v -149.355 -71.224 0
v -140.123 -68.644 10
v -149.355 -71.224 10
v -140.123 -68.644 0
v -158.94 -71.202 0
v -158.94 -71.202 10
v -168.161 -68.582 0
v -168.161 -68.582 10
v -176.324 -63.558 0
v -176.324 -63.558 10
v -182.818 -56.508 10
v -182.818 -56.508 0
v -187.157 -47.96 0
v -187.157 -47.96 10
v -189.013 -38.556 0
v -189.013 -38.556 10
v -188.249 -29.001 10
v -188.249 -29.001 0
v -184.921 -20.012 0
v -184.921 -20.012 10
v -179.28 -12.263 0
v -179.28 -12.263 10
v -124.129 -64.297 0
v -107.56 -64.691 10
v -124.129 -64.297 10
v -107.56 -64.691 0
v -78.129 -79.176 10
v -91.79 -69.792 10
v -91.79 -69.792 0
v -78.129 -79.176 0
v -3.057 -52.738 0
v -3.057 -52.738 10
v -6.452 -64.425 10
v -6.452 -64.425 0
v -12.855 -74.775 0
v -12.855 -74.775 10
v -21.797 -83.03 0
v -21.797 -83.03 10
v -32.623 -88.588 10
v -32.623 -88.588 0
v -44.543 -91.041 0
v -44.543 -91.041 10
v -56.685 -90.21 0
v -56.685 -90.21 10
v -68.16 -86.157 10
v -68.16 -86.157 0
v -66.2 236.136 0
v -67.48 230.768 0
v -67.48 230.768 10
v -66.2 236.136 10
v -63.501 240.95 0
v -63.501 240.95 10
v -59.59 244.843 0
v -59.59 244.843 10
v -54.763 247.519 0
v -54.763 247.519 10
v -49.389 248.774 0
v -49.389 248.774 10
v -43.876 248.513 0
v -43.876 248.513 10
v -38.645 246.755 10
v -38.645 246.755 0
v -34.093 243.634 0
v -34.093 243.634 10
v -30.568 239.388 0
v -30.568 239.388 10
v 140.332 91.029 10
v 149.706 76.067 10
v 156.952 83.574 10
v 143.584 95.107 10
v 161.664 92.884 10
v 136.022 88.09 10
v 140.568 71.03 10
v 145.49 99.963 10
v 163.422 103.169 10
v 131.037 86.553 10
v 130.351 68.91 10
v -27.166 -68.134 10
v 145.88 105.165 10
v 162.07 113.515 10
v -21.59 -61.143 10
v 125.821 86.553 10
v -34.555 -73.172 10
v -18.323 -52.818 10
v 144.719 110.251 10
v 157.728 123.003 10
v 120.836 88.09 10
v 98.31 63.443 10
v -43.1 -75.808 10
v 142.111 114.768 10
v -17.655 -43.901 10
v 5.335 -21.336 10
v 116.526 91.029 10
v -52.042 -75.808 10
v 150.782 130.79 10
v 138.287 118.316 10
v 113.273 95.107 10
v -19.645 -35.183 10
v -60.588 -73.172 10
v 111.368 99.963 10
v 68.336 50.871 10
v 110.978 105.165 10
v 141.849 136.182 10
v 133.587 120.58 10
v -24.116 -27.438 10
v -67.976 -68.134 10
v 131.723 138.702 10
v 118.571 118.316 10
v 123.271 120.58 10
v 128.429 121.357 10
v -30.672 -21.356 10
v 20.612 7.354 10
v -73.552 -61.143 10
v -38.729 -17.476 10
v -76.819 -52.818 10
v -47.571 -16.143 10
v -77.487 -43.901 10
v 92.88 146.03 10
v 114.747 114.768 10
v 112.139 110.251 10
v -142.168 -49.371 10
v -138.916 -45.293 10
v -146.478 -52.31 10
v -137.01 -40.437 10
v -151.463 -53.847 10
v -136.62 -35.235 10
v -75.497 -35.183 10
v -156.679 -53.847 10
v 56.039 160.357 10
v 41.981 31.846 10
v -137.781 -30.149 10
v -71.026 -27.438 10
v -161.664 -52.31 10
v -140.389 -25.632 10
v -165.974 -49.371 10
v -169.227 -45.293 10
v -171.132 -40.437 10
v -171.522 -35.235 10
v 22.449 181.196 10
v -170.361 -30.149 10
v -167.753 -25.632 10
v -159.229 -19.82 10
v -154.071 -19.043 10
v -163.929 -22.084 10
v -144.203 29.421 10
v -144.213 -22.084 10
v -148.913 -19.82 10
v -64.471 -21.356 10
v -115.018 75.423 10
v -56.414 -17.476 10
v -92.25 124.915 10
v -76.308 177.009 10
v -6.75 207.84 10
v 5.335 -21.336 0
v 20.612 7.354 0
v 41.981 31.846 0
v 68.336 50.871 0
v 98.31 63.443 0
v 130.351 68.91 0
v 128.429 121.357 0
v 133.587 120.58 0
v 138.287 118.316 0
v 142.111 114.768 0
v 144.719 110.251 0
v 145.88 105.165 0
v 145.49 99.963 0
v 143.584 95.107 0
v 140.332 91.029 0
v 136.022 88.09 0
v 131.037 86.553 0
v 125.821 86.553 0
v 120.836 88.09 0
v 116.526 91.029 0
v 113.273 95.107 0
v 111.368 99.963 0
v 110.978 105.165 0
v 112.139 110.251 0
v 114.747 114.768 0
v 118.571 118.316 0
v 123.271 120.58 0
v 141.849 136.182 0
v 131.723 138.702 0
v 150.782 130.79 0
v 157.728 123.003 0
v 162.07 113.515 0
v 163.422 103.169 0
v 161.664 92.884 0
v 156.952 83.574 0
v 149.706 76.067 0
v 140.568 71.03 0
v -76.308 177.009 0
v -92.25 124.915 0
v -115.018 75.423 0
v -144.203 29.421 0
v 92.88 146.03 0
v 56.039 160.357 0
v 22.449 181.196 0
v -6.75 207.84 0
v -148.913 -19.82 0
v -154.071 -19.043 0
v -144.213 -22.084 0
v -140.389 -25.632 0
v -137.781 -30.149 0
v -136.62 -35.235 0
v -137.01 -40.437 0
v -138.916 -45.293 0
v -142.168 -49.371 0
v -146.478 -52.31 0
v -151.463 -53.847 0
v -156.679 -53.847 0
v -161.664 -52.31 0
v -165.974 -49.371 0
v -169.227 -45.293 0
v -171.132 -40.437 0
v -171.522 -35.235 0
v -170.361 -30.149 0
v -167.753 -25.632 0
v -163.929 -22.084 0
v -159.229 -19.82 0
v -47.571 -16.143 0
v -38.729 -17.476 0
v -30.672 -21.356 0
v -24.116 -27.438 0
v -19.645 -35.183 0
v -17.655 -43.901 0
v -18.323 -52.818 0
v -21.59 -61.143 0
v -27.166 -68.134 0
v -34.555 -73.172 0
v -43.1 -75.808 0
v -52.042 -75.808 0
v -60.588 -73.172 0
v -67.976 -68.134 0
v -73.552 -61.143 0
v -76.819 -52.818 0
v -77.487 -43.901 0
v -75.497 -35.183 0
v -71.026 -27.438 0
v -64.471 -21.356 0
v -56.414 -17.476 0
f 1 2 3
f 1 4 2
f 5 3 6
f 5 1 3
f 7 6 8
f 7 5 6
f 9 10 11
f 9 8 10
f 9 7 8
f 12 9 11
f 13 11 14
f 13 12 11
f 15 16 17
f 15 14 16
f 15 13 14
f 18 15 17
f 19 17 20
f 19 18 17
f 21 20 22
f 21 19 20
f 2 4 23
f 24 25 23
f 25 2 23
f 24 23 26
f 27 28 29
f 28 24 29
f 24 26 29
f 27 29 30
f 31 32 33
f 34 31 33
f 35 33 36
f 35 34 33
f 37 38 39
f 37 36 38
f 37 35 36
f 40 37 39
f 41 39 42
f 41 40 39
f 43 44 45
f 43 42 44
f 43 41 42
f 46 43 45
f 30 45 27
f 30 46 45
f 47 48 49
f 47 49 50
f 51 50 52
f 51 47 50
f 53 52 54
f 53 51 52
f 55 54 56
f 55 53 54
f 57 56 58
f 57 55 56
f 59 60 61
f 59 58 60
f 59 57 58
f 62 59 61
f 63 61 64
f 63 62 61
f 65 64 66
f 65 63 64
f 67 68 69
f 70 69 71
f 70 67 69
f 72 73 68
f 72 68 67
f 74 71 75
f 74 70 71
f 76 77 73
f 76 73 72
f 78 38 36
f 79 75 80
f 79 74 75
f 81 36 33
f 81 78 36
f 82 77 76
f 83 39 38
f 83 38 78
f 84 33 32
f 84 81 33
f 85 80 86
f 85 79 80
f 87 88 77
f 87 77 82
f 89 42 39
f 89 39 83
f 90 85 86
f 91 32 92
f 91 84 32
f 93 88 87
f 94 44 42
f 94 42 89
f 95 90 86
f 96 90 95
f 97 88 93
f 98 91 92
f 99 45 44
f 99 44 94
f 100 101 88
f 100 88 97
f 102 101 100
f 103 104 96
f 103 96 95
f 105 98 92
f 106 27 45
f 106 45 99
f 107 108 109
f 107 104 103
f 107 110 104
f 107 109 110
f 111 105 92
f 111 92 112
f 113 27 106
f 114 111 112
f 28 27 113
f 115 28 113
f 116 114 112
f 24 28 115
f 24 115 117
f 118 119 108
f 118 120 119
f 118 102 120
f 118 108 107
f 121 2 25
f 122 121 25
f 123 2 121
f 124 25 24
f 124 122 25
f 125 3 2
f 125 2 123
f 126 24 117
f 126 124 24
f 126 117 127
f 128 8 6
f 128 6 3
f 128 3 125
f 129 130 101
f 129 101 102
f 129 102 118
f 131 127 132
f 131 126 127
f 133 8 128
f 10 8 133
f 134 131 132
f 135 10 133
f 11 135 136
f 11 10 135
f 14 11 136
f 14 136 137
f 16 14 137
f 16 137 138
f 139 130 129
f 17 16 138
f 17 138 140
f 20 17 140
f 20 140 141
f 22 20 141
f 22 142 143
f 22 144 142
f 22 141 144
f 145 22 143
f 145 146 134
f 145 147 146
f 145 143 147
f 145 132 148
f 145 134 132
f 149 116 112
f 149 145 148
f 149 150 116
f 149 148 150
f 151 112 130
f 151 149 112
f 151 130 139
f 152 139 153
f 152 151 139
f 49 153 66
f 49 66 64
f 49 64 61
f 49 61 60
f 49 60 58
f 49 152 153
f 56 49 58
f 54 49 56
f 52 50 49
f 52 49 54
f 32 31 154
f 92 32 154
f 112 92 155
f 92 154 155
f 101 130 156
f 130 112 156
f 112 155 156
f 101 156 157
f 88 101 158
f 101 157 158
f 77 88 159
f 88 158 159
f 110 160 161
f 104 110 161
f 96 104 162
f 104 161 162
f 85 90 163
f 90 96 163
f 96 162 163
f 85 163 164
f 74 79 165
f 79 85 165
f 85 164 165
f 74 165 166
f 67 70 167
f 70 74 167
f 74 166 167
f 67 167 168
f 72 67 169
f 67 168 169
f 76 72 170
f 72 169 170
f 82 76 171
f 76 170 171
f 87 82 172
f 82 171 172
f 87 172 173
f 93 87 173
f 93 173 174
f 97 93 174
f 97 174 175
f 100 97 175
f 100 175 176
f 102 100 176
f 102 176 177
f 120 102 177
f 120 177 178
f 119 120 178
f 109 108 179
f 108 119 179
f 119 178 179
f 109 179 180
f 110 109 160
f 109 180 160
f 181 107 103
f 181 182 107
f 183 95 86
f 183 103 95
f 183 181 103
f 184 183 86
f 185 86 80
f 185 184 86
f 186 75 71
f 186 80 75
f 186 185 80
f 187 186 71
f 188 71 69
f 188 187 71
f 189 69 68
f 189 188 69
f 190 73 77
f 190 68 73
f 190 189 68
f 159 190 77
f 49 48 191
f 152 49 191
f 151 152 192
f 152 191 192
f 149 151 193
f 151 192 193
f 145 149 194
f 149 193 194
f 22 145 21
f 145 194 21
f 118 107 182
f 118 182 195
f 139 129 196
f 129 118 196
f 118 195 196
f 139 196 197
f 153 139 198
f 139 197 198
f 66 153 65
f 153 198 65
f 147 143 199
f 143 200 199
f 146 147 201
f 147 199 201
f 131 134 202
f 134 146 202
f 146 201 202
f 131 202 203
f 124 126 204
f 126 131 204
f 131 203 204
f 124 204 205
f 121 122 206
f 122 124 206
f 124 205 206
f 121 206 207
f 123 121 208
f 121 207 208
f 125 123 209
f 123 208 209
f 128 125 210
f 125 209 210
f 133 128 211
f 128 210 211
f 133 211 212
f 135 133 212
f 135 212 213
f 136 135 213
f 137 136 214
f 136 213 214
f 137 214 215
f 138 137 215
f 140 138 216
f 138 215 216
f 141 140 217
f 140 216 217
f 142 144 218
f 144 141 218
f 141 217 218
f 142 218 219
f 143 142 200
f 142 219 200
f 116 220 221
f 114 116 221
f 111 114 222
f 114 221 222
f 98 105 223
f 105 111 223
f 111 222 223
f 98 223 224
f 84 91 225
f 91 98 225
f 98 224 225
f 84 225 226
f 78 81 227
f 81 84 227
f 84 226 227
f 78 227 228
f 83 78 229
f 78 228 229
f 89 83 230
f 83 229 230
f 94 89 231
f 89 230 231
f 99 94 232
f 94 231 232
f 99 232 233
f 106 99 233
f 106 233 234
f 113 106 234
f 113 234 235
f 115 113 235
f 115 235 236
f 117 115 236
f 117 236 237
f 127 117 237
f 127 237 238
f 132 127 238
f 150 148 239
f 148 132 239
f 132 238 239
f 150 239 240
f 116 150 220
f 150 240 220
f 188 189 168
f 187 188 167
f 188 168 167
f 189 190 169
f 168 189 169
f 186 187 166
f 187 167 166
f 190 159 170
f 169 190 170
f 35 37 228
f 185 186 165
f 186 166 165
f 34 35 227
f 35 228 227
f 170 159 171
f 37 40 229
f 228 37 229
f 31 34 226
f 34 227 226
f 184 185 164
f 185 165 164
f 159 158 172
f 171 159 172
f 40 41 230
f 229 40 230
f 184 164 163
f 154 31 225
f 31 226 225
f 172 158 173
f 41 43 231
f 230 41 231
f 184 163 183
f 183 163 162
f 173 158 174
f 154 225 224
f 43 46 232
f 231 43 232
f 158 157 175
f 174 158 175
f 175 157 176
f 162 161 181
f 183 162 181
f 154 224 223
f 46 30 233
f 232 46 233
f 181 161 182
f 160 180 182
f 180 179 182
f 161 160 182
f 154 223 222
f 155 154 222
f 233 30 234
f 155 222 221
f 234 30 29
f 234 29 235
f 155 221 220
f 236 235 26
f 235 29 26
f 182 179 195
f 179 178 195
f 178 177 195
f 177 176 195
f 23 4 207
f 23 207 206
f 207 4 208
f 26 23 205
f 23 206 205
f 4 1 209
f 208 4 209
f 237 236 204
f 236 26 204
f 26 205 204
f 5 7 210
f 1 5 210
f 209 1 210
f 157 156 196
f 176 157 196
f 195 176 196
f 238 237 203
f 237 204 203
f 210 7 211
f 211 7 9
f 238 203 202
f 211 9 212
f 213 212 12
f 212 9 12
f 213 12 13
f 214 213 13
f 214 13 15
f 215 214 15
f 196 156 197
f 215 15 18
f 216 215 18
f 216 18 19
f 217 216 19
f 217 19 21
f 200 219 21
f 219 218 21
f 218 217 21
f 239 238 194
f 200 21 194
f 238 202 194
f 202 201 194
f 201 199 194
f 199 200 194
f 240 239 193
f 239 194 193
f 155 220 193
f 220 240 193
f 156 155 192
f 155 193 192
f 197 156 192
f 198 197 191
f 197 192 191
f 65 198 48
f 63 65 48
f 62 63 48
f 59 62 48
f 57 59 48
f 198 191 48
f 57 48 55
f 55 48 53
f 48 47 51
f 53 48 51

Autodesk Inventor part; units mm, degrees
ref_plane "YZ Plane" through (0, 0, 0) normal (1, 0, 0) x (0, 1, 0)
ref_plane "XZ Plane" through (0, 0, 0) normal (0, 1, 0) x (-1, 0, 0)
ref_plane "XY Plane" through (0, 0, 0) normal (0, 0, 1) x (1, 0, 0)
sketch "Sketch1" plane through (0, 0, 0) normal (0, 0, 1) x (0, 1, 0)
  circle A0 centre (103.8572, -128.4288) radius 17.5
  circle A1 centre (-46.1428, 47.5712) radius 30
  circle A2 centre (-36.5428, 154.0712) radius 17.5
  arc A3 (-12.2627, 179.2798) -> (-68.6436, 140.1233) centre (-36.5428, 154.0712) ccw
  arc A4 (-79.1765, 78.1289) -> (-52.7383, 3.0571) centre (-46.1428, 47.5712) ccw
  arc A5 (68.91, -130.351) -> (138.7018, -131.7234) centre (103.8572, -128.4288) ccw
  arc A6 (239.3875, 30.5679) -> (230.7678, 67.4797) centre (228.8572, 47.5712) ccw
  arc A7 (-79.1765, 78.1289) -> (-68.6436, 140.1233) centre (-121.4095, 117.1964) ccw
  arc A8 (68.91, -130.351) -> (-52.7383, 3.0571) centre (-73.6667, -138.1931) ccw
  arc A9 (239.3875, 30.5679) -> (138.7018, -131.7234) centre (352.4092, -151.9293) ccw
  arc A10 (-12.2627, 179.2798) -> (230.7678, 67.4797) centre (269.5808, 471.9005) ccw
  dimension "d0" = 106.5
  dimension "d1" = 176
  dimension "d2" = 150
  dimension "d3" = 9.6
  dimension "d4" = 275
  dimension "d5" = 60
  dimension "d6" = 35
  dimension "d7" = 35
  dimension "d8" = 35
  dimension "d9" = 35
  dimension "d10" = 45
  dimension "d11" = 20
extrude "Extrusion1" add sketch "Sketch1" along normal blind 10
properties part number "3136 1133 85" material "Steel, Mild"
